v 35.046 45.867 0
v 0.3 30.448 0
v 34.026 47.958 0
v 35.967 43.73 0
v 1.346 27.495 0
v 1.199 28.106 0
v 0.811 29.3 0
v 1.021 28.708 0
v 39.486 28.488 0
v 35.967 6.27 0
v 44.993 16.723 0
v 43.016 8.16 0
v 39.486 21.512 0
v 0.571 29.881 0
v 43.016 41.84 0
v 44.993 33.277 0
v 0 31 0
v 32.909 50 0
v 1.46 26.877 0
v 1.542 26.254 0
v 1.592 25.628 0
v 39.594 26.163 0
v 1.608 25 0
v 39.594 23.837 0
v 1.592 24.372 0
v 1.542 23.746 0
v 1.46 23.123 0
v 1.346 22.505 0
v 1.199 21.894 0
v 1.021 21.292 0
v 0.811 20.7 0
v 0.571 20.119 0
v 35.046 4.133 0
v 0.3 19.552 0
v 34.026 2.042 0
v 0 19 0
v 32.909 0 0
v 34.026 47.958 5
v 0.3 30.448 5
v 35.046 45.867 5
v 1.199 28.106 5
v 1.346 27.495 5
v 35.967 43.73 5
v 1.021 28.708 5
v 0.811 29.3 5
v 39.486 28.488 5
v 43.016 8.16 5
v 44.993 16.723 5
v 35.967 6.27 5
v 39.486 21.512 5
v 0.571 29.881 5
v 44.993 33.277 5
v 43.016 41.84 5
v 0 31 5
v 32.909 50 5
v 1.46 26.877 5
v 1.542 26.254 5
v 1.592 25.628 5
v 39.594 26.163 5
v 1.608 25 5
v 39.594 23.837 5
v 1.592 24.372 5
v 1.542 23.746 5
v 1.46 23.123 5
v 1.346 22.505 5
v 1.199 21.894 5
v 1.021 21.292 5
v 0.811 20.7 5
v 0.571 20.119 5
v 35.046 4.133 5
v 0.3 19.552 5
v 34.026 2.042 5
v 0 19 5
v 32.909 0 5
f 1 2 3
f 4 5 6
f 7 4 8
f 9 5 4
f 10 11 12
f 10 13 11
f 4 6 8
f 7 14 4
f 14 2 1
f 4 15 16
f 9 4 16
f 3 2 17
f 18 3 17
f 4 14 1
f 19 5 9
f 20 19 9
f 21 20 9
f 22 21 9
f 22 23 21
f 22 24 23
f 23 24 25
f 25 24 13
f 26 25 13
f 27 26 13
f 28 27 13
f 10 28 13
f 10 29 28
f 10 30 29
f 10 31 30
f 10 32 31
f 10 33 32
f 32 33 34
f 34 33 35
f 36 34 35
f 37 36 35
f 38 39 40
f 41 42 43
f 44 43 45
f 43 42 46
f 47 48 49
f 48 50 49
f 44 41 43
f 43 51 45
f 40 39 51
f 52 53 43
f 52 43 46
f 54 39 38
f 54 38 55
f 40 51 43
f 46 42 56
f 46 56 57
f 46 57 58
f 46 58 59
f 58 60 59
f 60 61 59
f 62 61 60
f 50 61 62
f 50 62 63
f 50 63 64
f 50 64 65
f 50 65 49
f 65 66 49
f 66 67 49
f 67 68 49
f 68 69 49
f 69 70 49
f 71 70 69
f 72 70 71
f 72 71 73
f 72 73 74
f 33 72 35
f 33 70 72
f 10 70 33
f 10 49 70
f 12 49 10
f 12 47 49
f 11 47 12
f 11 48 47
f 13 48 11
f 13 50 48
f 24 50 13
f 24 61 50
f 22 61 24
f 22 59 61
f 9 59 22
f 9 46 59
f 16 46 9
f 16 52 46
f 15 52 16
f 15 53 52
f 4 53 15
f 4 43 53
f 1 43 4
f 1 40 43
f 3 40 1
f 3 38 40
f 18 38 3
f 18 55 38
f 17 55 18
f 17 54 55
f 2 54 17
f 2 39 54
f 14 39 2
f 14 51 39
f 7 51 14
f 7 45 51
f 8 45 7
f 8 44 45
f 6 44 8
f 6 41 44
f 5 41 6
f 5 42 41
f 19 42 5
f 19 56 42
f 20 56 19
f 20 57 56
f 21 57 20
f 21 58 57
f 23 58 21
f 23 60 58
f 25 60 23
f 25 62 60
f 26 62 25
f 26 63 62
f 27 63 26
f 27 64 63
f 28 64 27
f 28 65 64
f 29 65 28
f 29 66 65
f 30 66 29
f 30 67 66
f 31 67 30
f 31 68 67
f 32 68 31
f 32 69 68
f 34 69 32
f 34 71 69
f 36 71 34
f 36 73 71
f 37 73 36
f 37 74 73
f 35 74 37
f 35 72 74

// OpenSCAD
$fn = 32;

// ----------------------------------------------------------------------
// Gear sector: 2 teeth on 60 degrees
// ----------------------------------------------------------------------

// --- parameters (mm) ---
sector_angle = 60;        // sector angle, degrees
root_r = 50;              // root circle radius
tooth_h = 6;              // tooth height over the root circle
teeth = 2;                // number of teeth on the sector
hub_r = 12;               // hub bore radius
plate_t = 5;              // sector thickness, Z
arc_step = 3;             // sampling step of the root/hub arcs, degrees

tip_r = root_r + tooth_h;  // tip circle radius

profile = [[32.909, 0], [34.026, 2.042], [35.046, 4.133], [35.967, 6.27], [43.016, 8.16], [44.993, 16.723], [39.486, 21.512], [39.594, 23.837], [39.594, 26.163], [39.486, 28.488], [44.993, 33.277], [43.016, 41.84], [35.967, 43.73], [35.046, 45.867], [34.026, 47.958], [32.909, 50], [0, 31], [0.3, 30.448], [0.571, 29.881], [0.811, 29.3], [1.021, 28.708], [1.199, 28.106], [1.346, 27.495], [1.46, 26.877], [1.542, 26.254], [1.592, 25.628], [1.608, 25], [1.592, 24.372], [1.542, 23.746], [1.46, 23.123], [1.346, 22.505], [1.199, 21.894], [1.021, 21.292], [0.811, 20.7], [0.571, 20.119], [0.3, 19.552], [0, 19]];  // primary outline, 37 points, counter clockwise

// --- the one profile operation ---
linear_extrude(height = plate_t) polygon(points = profile);
